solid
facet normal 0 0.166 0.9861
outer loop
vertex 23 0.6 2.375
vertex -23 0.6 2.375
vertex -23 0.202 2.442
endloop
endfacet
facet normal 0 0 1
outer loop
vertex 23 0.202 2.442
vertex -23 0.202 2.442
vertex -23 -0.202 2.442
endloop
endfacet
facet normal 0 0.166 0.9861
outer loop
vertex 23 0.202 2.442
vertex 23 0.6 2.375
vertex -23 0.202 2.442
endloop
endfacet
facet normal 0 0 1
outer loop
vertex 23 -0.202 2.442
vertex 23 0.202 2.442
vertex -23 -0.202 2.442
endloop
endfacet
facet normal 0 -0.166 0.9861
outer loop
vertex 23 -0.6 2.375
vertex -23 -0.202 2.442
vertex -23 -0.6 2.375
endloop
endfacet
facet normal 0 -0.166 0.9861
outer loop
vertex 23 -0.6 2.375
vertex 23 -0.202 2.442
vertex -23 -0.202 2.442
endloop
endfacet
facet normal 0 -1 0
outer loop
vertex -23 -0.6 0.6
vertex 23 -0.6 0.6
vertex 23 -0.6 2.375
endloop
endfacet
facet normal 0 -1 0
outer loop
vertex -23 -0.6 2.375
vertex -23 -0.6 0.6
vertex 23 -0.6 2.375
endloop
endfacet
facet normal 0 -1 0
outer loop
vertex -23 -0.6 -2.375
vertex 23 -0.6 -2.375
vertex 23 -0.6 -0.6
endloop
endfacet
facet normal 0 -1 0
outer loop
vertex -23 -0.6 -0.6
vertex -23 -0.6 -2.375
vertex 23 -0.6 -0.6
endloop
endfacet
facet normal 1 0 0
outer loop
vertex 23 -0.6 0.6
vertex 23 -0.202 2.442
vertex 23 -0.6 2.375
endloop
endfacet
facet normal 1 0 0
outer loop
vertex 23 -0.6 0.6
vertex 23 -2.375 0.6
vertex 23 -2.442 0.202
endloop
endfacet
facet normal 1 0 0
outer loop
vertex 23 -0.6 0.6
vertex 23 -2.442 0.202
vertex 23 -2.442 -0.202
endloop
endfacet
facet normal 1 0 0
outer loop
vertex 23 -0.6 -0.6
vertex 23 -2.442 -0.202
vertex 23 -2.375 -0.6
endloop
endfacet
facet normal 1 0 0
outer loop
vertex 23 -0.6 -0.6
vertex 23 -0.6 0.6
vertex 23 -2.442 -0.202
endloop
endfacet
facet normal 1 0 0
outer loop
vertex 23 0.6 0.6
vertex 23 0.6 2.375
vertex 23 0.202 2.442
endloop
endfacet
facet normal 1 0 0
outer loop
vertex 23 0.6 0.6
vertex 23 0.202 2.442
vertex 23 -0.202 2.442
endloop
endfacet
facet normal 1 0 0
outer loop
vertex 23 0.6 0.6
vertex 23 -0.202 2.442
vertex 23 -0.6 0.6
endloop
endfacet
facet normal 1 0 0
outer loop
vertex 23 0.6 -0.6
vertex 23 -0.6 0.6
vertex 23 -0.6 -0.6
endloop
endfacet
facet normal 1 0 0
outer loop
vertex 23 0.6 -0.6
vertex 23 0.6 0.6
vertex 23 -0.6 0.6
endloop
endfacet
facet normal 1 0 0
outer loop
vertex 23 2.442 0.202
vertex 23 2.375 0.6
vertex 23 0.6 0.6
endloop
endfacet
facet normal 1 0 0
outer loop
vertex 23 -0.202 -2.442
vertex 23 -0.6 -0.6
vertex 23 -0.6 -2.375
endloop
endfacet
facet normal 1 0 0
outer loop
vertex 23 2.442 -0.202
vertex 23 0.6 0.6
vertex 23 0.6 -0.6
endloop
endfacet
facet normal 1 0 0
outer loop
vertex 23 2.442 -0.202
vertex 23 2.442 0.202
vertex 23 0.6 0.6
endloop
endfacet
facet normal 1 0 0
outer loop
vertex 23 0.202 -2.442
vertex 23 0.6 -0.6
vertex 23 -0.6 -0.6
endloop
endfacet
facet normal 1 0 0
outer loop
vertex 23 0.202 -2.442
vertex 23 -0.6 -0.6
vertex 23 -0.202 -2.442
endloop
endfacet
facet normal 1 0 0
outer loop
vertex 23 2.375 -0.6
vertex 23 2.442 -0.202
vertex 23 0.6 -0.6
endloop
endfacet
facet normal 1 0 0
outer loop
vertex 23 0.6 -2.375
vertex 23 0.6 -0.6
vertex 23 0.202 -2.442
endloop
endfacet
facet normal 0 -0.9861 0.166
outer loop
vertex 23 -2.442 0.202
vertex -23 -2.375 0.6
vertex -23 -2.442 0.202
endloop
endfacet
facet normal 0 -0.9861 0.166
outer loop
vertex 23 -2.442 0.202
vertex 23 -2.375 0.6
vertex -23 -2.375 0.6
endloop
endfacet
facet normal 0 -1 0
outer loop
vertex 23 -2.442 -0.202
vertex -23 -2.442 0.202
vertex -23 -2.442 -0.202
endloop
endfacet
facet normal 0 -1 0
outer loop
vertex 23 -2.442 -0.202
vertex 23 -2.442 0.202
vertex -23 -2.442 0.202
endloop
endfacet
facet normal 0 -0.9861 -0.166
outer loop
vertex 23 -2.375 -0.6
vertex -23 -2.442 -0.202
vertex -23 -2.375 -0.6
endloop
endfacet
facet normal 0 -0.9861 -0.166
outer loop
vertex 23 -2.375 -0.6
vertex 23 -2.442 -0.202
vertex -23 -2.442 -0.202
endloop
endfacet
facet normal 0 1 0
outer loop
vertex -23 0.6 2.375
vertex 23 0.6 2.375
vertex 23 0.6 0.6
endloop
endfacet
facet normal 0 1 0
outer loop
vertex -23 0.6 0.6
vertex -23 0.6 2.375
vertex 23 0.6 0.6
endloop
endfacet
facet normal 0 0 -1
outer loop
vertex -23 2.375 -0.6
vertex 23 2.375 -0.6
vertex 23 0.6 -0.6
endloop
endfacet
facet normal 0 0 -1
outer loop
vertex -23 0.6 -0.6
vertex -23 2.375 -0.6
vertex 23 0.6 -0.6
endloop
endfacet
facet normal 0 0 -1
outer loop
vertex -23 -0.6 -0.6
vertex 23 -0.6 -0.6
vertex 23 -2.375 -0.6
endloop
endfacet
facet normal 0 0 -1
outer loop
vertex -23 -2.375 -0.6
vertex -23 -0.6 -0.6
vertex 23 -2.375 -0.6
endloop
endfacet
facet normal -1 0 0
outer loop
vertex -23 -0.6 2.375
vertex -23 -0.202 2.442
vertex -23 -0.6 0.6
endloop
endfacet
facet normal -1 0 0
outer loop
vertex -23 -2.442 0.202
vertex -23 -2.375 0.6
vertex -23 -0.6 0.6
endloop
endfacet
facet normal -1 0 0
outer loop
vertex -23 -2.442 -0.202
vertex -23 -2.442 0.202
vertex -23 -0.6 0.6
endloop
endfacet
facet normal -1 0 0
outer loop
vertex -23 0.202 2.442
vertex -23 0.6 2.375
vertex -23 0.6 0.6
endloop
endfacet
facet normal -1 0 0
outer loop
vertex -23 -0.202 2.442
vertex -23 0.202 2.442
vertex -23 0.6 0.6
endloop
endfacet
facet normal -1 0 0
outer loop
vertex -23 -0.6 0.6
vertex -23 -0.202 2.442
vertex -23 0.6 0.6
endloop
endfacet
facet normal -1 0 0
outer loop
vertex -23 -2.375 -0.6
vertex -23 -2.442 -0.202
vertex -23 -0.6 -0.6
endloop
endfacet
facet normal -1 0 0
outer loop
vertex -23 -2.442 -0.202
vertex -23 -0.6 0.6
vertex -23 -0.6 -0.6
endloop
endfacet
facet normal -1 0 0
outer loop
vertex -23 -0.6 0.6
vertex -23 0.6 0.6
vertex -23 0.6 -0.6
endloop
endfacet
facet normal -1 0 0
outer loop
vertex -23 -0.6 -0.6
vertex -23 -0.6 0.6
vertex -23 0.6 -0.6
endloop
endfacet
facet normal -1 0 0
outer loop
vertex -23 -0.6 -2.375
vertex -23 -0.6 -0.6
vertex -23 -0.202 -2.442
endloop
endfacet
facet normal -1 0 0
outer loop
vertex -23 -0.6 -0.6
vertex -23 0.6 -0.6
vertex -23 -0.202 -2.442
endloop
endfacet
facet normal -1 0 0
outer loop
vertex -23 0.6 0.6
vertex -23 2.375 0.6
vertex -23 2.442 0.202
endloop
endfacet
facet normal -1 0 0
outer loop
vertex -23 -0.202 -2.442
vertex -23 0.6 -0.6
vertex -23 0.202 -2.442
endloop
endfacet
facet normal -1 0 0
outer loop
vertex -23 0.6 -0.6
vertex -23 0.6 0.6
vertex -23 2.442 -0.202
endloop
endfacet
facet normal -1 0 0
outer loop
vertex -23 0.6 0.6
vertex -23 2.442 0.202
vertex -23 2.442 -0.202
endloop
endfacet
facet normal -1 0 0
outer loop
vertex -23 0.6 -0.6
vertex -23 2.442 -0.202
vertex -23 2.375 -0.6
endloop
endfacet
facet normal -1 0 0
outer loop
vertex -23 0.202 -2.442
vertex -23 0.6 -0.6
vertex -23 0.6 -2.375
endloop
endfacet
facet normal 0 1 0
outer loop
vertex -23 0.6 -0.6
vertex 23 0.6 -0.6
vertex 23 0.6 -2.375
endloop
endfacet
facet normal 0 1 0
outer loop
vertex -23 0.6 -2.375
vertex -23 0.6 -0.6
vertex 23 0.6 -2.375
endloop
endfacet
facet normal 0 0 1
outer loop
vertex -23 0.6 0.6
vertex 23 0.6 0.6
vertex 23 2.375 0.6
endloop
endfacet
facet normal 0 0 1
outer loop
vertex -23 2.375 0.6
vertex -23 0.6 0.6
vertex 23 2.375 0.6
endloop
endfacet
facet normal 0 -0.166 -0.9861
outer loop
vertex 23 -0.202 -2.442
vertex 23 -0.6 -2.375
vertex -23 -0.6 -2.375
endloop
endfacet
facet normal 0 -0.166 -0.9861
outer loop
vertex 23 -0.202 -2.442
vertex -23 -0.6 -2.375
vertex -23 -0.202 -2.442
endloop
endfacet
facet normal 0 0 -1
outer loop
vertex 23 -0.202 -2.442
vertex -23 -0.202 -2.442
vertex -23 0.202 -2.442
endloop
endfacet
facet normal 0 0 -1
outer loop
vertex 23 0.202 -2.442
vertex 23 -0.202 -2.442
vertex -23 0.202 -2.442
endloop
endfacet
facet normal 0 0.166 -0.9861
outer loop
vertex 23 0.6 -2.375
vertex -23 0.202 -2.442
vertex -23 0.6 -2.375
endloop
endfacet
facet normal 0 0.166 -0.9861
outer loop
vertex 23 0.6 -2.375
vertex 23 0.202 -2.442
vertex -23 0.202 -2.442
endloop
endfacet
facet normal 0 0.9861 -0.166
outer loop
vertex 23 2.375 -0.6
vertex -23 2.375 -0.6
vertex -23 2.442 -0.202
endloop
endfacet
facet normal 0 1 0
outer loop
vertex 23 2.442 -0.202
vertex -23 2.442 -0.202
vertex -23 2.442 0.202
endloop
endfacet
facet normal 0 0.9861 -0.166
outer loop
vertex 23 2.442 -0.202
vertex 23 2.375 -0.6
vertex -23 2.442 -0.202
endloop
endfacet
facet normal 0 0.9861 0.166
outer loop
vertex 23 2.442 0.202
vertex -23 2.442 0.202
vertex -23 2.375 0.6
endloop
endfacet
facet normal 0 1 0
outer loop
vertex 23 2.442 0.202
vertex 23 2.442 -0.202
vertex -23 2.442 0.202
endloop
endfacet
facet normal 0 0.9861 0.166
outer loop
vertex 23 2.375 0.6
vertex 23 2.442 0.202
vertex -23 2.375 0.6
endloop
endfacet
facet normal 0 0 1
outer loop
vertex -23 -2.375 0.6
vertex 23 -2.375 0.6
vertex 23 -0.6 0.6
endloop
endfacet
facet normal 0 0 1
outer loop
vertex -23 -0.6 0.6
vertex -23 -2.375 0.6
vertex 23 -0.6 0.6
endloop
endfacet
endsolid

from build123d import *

# Parameters (mm, degrees)
SKETCH_1_R          = 2.45
EXTRUDE_1_DEPTH     = 23
SKETCH_2_OUTSIDE_W  = 16.204
SKETCH_2_OUTSIDE_H  = 16.204
CUT_EXTRUDE_1_DEPTH = 47


with BuildPart() as part:
    # 草图1 → 凸台-拉伸1 (new body, symmetric)
    with BuildSketch(Plane(origin=(0, 0, 0), x_dir=(0, 0, -1), z_dir=(1, 0, 0))):
        Circle(SKETCH_1_R)
    extrude(amount=EXTRUDE_1_DEPTH, both=True)

    # 草图2 outside → 切除-拉伸1 (cut, through all)
    with BuildSketch(Plane(origin=(23, 0, 0), x_dir=(0, 0, -1), z_dir=(1, 0, 0))):
        Rectangle(SKETCH_2_OUTSIDE_W, SKETCH_2_OUTSIDE_H)
        Polygon((-3, 0.6), (-0.6, 0.6), (-0.6, 3), (0.6, 3), (0.6, 0.6), (3, 0.6), (3, -0.6), (0.6, -0.6), (0.6, -3), (-0.6, -3), (-0.6, -0.6), (-3, -0.6), align=None, mode=Mode.SUBTRACT)
    extrude(amount=-CUT_EXTRUDE_1_DEPTH, mode=Mode.SUBTRACT)


solid = part.part
